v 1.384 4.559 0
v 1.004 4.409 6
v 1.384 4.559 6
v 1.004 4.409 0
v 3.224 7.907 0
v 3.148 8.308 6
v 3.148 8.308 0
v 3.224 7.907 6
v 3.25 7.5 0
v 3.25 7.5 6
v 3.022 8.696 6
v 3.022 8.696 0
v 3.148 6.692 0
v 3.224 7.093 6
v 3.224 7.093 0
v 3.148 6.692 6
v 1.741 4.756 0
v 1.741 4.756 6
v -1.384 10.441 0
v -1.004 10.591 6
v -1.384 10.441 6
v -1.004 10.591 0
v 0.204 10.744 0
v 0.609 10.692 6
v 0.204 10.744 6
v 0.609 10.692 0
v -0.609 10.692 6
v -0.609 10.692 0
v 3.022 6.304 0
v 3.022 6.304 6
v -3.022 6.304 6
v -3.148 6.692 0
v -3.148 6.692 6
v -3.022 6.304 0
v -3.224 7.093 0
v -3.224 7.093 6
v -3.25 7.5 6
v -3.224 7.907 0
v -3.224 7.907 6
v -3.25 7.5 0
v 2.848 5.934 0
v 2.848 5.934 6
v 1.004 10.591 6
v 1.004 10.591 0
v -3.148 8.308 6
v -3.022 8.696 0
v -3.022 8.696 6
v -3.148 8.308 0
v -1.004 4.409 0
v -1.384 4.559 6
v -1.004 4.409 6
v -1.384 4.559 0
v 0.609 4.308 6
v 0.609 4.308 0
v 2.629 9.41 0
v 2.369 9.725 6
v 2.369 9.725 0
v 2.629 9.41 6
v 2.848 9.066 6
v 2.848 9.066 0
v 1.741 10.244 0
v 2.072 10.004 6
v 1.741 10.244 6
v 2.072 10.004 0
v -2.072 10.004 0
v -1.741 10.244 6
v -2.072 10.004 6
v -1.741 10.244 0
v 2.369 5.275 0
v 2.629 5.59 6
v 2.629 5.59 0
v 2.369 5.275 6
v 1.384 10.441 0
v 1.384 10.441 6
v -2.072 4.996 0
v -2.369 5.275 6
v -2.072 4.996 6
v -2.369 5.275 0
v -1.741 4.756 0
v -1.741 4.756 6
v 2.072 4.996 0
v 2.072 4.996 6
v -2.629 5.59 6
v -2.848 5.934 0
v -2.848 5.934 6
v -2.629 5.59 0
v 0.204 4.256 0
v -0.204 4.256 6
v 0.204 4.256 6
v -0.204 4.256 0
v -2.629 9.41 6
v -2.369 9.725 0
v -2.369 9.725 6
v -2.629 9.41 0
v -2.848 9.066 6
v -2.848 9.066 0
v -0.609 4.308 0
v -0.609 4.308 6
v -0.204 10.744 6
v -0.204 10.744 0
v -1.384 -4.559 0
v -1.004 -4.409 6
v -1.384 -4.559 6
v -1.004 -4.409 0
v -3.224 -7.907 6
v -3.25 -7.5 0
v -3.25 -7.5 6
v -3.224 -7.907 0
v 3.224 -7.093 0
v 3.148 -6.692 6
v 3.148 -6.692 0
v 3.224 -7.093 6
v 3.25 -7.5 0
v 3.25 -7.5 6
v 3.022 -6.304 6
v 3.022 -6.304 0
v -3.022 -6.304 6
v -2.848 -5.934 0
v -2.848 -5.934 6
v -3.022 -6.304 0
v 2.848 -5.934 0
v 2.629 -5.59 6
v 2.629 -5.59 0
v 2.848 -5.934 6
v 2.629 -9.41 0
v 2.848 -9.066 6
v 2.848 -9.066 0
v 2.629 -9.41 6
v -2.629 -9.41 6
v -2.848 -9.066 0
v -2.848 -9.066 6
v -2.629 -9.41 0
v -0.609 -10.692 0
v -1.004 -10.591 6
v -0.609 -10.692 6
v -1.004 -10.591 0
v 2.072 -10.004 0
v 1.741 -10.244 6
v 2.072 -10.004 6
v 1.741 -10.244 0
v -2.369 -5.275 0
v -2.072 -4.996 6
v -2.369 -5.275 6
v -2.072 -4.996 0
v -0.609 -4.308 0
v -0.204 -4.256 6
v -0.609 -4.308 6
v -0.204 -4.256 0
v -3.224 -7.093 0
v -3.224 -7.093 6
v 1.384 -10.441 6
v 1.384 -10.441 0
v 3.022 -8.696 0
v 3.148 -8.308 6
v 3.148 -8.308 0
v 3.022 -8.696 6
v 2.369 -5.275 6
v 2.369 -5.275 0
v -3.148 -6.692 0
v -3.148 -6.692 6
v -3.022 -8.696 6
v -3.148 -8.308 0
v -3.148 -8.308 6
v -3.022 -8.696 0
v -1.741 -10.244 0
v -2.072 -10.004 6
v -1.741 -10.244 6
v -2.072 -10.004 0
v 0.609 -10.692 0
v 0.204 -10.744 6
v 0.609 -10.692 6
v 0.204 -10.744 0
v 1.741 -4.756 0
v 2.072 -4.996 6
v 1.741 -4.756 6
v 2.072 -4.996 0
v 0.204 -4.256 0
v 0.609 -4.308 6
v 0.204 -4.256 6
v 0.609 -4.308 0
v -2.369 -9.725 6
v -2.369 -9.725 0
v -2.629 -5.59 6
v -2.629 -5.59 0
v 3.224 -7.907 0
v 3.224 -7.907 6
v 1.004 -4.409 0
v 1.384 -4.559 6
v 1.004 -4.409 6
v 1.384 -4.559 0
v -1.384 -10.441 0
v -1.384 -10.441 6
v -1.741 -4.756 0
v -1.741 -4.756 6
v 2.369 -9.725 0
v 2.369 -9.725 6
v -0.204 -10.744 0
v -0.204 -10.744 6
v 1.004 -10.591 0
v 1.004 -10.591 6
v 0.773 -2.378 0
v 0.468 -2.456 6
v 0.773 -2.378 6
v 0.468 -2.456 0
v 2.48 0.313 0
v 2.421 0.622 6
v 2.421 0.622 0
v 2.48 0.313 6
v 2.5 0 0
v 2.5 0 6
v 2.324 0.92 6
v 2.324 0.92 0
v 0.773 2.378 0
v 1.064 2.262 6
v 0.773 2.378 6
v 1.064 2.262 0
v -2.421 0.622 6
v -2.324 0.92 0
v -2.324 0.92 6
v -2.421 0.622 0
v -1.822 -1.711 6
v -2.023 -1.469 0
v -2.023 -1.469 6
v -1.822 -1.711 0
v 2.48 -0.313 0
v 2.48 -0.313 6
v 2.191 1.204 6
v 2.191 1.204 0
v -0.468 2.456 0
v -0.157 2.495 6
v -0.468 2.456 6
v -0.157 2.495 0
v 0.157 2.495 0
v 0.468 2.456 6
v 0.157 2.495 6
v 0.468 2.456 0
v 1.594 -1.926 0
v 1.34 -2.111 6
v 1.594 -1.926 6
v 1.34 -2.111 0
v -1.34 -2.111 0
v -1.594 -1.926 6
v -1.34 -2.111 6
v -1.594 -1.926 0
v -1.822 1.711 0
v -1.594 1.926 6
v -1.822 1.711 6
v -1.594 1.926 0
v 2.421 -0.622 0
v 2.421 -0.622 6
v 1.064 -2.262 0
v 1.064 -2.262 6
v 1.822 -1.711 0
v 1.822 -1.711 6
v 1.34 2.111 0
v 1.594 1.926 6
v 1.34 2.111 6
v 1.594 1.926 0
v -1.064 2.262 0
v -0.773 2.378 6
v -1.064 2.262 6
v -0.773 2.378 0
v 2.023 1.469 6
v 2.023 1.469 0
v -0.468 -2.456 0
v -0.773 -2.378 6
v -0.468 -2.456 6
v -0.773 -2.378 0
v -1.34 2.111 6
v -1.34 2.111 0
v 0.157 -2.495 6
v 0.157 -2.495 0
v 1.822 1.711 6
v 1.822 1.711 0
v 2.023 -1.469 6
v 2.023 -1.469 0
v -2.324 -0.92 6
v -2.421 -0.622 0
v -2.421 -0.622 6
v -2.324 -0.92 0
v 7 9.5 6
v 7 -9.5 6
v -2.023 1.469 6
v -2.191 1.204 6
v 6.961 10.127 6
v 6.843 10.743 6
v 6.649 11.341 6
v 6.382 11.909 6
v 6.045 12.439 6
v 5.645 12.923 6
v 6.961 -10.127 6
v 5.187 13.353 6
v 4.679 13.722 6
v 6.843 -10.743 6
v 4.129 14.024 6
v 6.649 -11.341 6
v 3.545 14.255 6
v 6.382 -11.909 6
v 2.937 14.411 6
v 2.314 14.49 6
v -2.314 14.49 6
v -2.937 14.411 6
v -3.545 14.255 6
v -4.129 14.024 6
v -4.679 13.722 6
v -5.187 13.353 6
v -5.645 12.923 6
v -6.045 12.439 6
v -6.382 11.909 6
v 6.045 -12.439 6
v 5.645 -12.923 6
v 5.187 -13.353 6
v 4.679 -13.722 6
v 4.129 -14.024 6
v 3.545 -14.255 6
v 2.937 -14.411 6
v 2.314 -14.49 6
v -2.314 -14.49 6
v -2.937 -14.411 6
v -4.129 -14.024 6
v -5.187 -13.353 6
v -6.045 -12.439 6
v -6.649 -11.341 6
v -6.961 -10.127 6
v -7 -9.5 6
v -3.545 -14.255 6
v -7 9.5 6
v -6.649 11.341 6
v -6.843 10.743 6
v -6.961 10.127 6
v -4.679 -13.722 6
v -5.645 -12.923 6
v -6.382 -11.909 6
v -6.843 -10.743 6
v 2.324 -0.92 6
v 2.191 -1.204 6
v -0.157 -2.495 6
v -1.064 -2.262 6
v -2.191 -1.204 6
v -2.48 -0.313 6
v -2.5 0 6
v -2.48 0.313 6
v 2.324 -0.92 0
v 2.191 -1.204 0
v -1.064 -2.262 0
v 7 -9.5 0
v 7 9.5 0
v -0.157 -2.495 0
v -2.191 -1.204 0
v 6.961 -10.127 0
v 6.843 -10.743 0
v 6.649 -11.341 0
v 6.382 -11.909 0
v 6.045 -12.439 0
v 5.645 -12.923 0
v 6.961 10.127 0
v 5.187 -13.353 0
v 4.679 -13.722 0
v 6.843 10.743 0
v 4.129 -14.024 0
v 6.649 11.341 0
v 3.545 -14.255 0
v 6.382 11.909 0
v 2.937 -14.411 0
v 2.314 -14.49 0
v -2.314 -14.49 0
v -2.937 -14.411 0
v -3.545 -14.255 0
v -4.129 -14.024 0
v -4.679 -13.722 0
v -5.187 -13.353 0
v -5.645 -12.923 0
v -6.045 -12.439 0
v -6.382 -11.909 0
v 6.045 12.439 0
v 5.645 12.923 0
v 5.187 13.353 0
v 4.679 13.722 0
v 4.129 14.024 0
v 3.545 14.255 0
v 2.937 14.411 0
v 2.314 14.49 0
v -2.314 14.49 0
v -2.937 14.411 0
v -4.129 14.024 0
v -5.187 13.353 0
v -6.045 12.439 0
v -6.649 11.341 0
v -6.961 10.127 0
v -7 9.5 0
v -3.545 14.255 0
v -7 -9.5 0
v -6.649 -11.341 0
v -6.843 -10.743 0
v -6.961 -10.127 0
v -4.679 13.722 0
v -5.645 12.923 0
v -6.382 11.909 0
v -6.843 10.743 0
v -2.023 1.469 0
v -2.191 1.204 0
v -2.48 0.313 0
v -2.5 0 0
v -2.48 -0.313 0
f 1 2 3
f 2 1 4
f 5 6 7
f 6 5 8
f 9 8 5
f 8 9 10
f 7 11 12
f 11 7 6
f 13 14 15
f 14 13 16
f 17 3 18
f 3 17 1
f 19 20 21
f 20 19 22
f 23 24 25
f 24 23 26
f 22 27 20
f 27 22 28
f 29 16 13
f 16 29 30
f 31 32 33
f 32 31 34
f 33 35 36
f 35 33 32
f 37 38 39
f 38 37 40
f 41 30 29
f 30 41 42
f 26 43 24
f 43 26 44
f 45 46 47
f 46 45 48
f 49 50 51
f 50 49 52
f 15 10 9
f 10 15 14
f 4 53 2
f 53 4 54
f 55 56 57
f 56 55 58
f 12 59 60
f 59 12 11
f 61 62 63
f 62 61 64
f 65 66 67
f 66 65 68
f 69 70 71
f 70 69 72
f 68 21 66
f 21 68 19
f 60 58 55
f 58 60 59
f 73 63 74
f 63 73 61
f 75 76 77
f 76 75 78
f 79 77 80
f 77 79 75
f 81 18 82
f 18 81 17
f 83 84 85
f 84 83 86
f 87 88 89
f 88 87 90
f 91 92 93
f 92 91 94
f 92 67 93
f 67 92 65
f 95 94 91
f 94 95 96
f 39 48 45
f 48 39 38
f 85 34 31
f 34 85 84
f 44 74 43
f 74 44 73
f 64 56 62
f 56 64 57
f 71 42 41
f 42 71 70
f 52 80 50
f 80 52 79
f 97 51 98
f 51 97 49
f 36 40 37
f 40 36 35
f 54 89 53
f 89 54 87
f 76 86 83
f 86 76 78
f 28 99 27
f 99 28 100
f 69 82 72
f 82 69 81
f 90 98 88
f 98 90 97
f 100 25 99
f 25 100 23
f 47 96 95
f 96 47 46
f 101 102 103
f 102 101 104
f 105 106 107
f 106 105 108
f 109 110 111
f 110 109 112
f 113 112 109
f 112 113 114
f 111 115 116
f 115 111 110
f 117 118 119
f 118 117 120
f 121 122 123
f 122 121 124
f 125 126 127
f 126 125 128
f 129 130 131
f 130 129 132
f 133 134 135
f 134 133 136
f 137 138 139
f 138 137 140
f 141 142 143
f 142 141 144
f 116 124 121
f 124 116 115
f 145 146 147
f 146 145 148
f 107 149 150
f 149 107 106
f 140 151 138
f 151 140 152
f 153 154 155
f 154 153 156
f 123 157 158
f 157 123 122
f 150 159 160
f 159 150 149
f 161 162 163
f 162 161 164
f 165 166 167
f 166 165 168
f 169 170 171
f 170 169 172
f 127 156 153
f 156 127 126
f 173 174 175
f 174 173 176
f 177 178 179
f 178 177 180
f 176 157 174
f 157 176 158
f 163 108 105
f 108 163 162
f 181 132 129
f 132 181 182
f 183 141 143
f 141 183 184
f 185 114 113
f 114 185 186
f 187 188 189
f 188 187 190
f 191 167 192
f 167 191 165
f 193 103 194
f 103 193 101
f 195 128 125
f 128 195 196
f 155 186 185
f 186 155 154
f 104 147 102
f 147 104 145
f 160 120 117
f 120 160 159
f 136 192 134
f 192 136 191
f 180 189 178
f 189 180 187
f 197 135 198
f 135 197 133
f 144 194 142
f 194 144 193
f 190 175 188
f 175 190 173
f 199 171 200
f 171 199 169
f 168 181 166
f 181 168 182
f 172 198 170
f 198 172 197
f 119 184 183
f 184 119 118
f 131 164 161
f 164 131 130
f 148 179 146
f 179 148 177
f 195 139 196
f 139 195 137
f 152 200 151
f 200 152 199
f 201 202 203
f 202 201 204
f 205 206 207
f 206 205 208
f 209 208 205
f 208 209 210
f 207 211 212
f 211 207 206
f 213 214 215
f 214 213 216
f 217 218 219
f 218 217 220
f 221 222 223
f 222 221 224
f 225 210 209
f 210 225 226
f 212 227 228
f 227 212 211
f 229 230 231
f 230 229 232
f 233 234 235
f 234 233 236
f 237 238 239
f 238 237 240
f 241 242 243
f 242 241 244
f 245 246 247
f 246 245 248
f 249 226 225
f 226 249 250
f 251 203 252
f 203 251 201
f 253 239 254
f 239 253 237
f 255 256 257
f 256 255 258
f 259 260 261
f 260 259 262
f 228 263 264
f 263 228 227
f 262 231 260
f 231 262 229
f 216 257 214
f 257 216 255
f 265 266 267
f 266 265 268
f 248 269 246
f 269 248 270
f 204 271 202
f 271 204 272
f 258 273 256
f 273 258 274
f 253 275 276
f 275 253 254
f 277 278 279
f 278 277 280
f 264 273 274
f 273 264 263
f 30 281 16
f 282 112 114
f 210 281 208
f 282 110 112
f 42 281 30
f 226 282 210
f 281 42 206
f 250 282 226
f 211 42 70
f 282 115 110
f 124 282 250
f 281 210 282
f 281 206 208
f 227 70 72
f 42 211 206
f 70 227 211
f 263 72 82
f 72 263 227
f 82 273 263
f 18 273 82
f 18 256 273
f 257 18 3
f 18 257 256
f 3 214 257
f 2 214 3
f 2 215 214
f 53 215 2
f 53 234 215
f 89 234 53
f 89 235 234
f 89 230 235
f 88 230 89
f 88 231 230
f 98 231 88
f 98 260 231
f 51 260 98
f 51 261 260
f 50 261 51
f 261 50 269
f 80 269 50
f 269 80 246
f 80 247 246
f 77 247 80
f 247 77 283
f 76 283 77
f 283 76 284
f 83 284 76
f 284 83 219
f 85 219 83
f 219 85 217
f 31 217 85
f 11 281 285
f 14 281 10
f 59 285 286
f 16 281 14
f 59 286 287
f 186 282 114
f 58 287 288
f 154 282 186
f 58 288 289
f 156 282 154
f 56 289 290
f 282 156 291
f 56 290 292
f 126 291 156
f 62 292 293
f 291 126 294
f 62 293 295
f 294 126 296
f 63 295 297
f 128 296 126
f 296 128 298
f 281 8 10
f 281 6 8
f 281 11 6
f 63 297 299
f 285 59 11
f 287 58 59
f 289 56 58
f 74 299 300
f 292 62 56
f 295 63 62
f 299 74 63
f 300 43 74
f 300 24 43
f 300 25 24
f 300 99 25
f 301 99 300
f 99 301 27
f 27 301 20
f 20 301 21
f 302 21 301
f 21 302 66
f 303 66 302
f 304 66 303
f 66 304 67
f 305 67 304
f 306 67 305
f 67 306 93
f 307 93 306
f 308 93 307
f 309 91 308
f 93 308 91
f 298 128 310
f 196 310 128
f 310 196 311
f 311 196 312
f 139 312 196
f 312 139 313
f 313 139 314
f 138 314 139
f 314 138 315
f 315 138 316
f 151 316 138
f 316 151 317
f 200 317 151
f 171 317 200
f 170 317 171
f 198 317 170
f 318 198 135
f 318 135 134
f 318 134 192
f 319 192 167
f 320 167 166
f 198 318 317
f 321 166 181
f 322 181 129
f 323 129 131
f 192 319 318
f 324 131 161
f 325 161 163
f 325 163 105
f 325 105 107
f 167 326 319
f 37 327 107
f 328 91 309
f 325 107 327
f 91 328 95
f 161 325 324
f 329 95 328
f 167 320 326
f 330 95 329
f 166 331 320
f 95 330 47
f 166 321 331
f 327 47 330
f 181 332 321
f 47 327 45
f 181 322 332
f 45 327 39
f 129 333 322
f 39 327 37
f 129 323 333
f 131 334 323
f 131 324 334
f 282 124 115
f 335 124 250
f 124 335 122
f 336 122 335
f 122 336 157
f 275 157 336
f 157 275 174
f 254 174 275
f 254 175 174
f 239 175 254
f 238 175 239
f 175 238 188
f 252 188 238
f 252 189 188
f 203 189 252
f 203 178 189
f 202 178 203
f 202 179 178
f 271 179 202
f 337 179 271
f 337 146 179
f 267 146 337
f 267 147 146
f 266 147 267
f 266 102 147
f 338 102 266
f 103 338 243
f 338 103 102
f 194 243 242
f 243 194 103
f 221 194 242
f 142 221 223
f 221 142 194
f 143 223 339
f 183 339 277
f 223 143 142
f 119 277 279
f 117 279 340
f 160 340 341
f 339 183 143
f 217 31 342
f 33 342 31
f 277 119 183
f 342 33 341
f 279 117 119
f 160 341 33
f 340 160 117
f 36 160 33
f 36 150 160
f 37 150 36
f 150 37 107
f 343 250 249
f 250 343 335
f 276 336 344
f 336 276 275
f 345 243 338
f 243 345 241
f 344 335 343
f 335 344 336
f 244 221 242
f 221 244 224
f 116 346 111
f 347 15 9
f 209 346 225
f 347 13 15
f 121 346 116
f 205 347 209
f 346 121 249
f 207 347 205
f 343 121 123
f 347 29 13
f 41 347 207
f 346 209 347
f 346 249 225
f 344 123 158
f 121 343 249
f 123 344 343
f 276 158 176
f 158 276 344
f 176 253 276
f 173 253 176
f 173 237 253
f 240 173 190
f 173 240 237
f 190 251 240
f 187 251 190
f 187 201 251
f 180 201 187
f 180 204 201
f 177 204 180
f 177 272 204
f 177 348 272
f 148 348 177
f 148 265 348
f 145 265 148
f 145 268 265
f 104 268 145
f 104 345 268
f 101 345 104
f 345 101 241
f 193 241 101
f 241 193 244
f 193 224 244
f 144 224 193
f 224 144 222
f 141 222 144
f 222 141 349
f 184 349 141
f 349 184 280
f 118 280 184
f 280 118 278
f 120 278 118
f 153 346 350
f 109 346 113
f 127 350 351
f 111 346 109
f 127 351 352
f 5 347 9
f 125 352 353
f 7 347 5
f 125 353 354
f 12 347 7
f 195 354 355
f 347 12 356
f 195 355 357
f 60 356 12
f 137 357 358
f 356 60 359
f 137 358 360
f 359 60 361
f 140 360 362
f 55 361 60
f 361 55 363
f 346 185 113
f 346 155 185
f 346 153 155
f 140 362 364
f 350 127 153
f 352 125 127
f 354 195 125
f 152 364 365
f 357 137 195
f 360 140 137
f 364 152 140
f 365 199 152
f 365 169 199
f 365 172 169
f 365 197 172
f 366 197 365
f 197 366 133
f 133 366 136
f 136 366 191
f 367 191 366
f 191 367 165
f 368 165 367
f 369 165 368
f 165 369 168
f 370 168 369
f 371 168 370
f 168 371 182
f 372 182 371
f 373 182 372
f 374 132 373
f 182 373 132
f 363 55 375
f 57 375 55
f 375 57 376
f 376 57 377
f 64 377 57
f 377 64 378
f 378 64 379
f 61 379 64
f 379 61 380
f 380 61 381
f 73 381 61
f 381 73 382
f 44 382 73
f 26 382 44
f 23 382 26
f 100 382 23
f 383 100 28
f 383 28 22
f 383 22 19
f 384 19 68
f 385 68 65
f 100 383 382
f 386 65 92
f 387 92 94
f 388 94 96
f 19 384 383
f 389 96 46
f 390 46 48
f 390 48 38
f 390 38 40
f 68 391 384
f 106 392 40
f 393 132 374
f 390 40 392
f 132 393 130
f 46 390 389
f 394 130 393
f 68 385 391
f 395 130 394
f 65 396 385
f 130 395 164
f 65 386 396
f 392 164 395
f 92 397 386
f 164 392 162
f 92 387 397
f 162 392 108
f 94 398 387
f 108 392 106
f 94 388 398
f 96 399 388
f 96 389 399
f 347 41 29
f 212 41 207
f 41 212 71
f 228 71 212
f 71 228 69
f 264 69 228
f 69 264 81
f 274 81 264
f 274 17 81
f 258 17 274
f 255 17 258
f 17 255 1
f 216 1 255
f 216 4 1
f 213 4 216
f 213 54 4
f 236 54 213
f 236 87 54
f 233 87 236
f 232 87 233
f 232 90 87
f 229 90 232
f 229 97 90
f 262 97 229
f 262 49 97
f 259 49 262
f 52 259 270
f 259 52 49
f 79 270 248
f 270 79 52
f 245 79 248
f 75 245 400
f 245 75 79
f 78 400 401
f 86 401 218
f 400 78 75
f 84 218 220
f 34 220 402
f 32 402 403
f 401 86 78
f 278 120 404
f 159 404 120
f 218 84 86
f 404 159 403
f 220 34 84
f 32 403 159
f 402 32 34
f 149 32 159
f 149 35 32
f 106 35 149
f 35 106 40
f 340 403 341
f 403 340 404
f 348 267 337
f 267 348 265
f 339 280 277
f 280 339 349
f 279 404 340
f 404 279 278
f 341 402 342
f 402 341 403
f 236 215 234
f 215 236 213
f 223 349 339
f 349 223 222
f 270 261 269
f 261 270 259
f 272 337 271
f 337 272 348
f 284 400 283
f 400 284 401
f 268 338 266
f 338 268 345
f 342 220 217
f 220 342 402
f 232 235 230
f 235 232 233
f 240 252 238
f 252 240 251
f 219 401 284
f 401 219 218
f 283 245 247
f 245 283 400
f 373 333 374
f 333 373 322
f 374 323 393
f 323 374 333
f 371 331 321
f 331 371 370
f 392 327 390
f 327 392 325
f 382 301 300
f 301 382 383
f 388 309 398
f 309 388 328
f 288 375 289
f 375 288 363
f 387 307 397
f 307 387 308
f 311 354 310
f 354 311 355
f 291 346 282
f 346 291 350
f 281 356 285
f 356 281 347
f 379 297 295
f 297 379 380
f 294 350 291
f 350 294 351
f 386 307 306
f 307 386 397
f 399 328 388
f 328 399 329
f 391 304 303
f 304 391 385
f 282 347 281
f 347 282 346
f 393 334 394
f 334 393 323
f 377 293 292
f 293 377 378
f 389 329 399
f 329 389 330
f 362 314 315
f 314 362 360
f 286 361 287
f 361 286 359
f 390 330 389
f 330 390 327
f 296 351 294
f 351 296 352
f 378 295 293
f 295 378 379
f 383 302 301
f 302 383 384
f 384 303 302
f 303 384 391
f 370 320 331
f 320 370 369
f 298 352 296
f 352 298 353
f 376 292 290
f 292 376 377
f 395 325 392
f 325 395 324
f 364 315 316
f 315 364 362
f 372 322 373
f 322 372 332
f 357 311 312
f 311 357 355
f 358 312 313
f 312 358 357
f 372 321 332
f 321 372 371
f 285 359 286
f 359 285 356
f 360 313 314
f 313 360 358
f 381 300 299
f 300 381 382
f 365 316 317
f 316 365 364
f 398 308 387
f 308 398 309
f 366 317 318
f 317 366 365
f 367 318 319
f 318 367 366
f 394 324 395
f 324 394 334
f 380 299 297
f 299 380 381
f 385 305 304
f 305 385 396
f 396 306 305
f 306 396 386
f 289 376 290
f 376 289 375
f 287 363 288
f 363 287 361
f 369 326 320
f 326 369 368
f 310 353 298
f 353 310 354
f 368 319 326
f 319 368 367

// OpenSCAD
$fn = 50;


difference() {
	union() {
		hull() {
			translate(v = [-2.0000000000, 9.5000000000, 0]) {
				cylinder(h = 6, r = 5);
			}
			translate(v = [2.0000000000, 9.5000000000, 0]) {
				cylinder(h = 6, r = 5);
			}
			translate(v = [-2.0000000000, -9.5000000000, 0]) {
				cylinder(h = 6, r = 5);
			}
			translate(v = [2.0000000000, -9.5000000000, 0]) {
				cylinder(h = 6, r = 5);
			}
		}
	}
	union() {
		#translate(v = [0.0000000000, 7.5000000000, 0]) {
			cylinder(h = 6, r = 3.2500000000);
		}
		#translate(v = [0.0000000000, -7.5000000000, 0]) {
			cylinder(h = 6, r = 3.2500000000);
		}
		#translate(v = [0.0000000000, -7.5000000000, -100.0000000000]) {
			cylinder(h = 200, r = 3.2500000000);
		}
		#translate(v = [0.0000000000, -7.5000000000, -100.0000000000]) {
			cylinder(h = 200, r = 3.2500000000);
		}
		#translate(v = [0.0000000000, 7.5000000000, -100.0000000000]) {
			cylinder(h = 200, r = 3.2500000000);
		}
		#translate(v = [0.0000000000, 7.5000000000, -100.0000000000]) {
			cylinder(h = 200, r = 3.2500000000);
		}
		#translate(v = [0.0000000000, 7.5000000000, 0]) {
			cylinder(h = 6, r = 1.8000000000);
		}
		#translate(v = [0.0000000000, -7.5000000000, 0]) {
			cylinder(h = 6, r = 1.8000000000);
		}
		#translate(v = [0.0000000000, 7.5000000000, 0]) {
			cylinder(h = 6, r = 1.8000000000);
		}
		#translate(v = [0.0000000000, -7.5000000000, 0]) {
			cylinder(h = 6, r = 1.8000000000);
		}
		#translate(v = [0.0000000000, 7.5000000000, 0]) {
			cylinder(h = 6, r = 1.8000000000);
		}
		#translate(v = [0.0000000000, -7.5000000000, 0]) {
			cylinder(h = 6, r = 1.8000000000);
		}
		#cylinder(h = 6, r = 2.5000000000);
	}
}
